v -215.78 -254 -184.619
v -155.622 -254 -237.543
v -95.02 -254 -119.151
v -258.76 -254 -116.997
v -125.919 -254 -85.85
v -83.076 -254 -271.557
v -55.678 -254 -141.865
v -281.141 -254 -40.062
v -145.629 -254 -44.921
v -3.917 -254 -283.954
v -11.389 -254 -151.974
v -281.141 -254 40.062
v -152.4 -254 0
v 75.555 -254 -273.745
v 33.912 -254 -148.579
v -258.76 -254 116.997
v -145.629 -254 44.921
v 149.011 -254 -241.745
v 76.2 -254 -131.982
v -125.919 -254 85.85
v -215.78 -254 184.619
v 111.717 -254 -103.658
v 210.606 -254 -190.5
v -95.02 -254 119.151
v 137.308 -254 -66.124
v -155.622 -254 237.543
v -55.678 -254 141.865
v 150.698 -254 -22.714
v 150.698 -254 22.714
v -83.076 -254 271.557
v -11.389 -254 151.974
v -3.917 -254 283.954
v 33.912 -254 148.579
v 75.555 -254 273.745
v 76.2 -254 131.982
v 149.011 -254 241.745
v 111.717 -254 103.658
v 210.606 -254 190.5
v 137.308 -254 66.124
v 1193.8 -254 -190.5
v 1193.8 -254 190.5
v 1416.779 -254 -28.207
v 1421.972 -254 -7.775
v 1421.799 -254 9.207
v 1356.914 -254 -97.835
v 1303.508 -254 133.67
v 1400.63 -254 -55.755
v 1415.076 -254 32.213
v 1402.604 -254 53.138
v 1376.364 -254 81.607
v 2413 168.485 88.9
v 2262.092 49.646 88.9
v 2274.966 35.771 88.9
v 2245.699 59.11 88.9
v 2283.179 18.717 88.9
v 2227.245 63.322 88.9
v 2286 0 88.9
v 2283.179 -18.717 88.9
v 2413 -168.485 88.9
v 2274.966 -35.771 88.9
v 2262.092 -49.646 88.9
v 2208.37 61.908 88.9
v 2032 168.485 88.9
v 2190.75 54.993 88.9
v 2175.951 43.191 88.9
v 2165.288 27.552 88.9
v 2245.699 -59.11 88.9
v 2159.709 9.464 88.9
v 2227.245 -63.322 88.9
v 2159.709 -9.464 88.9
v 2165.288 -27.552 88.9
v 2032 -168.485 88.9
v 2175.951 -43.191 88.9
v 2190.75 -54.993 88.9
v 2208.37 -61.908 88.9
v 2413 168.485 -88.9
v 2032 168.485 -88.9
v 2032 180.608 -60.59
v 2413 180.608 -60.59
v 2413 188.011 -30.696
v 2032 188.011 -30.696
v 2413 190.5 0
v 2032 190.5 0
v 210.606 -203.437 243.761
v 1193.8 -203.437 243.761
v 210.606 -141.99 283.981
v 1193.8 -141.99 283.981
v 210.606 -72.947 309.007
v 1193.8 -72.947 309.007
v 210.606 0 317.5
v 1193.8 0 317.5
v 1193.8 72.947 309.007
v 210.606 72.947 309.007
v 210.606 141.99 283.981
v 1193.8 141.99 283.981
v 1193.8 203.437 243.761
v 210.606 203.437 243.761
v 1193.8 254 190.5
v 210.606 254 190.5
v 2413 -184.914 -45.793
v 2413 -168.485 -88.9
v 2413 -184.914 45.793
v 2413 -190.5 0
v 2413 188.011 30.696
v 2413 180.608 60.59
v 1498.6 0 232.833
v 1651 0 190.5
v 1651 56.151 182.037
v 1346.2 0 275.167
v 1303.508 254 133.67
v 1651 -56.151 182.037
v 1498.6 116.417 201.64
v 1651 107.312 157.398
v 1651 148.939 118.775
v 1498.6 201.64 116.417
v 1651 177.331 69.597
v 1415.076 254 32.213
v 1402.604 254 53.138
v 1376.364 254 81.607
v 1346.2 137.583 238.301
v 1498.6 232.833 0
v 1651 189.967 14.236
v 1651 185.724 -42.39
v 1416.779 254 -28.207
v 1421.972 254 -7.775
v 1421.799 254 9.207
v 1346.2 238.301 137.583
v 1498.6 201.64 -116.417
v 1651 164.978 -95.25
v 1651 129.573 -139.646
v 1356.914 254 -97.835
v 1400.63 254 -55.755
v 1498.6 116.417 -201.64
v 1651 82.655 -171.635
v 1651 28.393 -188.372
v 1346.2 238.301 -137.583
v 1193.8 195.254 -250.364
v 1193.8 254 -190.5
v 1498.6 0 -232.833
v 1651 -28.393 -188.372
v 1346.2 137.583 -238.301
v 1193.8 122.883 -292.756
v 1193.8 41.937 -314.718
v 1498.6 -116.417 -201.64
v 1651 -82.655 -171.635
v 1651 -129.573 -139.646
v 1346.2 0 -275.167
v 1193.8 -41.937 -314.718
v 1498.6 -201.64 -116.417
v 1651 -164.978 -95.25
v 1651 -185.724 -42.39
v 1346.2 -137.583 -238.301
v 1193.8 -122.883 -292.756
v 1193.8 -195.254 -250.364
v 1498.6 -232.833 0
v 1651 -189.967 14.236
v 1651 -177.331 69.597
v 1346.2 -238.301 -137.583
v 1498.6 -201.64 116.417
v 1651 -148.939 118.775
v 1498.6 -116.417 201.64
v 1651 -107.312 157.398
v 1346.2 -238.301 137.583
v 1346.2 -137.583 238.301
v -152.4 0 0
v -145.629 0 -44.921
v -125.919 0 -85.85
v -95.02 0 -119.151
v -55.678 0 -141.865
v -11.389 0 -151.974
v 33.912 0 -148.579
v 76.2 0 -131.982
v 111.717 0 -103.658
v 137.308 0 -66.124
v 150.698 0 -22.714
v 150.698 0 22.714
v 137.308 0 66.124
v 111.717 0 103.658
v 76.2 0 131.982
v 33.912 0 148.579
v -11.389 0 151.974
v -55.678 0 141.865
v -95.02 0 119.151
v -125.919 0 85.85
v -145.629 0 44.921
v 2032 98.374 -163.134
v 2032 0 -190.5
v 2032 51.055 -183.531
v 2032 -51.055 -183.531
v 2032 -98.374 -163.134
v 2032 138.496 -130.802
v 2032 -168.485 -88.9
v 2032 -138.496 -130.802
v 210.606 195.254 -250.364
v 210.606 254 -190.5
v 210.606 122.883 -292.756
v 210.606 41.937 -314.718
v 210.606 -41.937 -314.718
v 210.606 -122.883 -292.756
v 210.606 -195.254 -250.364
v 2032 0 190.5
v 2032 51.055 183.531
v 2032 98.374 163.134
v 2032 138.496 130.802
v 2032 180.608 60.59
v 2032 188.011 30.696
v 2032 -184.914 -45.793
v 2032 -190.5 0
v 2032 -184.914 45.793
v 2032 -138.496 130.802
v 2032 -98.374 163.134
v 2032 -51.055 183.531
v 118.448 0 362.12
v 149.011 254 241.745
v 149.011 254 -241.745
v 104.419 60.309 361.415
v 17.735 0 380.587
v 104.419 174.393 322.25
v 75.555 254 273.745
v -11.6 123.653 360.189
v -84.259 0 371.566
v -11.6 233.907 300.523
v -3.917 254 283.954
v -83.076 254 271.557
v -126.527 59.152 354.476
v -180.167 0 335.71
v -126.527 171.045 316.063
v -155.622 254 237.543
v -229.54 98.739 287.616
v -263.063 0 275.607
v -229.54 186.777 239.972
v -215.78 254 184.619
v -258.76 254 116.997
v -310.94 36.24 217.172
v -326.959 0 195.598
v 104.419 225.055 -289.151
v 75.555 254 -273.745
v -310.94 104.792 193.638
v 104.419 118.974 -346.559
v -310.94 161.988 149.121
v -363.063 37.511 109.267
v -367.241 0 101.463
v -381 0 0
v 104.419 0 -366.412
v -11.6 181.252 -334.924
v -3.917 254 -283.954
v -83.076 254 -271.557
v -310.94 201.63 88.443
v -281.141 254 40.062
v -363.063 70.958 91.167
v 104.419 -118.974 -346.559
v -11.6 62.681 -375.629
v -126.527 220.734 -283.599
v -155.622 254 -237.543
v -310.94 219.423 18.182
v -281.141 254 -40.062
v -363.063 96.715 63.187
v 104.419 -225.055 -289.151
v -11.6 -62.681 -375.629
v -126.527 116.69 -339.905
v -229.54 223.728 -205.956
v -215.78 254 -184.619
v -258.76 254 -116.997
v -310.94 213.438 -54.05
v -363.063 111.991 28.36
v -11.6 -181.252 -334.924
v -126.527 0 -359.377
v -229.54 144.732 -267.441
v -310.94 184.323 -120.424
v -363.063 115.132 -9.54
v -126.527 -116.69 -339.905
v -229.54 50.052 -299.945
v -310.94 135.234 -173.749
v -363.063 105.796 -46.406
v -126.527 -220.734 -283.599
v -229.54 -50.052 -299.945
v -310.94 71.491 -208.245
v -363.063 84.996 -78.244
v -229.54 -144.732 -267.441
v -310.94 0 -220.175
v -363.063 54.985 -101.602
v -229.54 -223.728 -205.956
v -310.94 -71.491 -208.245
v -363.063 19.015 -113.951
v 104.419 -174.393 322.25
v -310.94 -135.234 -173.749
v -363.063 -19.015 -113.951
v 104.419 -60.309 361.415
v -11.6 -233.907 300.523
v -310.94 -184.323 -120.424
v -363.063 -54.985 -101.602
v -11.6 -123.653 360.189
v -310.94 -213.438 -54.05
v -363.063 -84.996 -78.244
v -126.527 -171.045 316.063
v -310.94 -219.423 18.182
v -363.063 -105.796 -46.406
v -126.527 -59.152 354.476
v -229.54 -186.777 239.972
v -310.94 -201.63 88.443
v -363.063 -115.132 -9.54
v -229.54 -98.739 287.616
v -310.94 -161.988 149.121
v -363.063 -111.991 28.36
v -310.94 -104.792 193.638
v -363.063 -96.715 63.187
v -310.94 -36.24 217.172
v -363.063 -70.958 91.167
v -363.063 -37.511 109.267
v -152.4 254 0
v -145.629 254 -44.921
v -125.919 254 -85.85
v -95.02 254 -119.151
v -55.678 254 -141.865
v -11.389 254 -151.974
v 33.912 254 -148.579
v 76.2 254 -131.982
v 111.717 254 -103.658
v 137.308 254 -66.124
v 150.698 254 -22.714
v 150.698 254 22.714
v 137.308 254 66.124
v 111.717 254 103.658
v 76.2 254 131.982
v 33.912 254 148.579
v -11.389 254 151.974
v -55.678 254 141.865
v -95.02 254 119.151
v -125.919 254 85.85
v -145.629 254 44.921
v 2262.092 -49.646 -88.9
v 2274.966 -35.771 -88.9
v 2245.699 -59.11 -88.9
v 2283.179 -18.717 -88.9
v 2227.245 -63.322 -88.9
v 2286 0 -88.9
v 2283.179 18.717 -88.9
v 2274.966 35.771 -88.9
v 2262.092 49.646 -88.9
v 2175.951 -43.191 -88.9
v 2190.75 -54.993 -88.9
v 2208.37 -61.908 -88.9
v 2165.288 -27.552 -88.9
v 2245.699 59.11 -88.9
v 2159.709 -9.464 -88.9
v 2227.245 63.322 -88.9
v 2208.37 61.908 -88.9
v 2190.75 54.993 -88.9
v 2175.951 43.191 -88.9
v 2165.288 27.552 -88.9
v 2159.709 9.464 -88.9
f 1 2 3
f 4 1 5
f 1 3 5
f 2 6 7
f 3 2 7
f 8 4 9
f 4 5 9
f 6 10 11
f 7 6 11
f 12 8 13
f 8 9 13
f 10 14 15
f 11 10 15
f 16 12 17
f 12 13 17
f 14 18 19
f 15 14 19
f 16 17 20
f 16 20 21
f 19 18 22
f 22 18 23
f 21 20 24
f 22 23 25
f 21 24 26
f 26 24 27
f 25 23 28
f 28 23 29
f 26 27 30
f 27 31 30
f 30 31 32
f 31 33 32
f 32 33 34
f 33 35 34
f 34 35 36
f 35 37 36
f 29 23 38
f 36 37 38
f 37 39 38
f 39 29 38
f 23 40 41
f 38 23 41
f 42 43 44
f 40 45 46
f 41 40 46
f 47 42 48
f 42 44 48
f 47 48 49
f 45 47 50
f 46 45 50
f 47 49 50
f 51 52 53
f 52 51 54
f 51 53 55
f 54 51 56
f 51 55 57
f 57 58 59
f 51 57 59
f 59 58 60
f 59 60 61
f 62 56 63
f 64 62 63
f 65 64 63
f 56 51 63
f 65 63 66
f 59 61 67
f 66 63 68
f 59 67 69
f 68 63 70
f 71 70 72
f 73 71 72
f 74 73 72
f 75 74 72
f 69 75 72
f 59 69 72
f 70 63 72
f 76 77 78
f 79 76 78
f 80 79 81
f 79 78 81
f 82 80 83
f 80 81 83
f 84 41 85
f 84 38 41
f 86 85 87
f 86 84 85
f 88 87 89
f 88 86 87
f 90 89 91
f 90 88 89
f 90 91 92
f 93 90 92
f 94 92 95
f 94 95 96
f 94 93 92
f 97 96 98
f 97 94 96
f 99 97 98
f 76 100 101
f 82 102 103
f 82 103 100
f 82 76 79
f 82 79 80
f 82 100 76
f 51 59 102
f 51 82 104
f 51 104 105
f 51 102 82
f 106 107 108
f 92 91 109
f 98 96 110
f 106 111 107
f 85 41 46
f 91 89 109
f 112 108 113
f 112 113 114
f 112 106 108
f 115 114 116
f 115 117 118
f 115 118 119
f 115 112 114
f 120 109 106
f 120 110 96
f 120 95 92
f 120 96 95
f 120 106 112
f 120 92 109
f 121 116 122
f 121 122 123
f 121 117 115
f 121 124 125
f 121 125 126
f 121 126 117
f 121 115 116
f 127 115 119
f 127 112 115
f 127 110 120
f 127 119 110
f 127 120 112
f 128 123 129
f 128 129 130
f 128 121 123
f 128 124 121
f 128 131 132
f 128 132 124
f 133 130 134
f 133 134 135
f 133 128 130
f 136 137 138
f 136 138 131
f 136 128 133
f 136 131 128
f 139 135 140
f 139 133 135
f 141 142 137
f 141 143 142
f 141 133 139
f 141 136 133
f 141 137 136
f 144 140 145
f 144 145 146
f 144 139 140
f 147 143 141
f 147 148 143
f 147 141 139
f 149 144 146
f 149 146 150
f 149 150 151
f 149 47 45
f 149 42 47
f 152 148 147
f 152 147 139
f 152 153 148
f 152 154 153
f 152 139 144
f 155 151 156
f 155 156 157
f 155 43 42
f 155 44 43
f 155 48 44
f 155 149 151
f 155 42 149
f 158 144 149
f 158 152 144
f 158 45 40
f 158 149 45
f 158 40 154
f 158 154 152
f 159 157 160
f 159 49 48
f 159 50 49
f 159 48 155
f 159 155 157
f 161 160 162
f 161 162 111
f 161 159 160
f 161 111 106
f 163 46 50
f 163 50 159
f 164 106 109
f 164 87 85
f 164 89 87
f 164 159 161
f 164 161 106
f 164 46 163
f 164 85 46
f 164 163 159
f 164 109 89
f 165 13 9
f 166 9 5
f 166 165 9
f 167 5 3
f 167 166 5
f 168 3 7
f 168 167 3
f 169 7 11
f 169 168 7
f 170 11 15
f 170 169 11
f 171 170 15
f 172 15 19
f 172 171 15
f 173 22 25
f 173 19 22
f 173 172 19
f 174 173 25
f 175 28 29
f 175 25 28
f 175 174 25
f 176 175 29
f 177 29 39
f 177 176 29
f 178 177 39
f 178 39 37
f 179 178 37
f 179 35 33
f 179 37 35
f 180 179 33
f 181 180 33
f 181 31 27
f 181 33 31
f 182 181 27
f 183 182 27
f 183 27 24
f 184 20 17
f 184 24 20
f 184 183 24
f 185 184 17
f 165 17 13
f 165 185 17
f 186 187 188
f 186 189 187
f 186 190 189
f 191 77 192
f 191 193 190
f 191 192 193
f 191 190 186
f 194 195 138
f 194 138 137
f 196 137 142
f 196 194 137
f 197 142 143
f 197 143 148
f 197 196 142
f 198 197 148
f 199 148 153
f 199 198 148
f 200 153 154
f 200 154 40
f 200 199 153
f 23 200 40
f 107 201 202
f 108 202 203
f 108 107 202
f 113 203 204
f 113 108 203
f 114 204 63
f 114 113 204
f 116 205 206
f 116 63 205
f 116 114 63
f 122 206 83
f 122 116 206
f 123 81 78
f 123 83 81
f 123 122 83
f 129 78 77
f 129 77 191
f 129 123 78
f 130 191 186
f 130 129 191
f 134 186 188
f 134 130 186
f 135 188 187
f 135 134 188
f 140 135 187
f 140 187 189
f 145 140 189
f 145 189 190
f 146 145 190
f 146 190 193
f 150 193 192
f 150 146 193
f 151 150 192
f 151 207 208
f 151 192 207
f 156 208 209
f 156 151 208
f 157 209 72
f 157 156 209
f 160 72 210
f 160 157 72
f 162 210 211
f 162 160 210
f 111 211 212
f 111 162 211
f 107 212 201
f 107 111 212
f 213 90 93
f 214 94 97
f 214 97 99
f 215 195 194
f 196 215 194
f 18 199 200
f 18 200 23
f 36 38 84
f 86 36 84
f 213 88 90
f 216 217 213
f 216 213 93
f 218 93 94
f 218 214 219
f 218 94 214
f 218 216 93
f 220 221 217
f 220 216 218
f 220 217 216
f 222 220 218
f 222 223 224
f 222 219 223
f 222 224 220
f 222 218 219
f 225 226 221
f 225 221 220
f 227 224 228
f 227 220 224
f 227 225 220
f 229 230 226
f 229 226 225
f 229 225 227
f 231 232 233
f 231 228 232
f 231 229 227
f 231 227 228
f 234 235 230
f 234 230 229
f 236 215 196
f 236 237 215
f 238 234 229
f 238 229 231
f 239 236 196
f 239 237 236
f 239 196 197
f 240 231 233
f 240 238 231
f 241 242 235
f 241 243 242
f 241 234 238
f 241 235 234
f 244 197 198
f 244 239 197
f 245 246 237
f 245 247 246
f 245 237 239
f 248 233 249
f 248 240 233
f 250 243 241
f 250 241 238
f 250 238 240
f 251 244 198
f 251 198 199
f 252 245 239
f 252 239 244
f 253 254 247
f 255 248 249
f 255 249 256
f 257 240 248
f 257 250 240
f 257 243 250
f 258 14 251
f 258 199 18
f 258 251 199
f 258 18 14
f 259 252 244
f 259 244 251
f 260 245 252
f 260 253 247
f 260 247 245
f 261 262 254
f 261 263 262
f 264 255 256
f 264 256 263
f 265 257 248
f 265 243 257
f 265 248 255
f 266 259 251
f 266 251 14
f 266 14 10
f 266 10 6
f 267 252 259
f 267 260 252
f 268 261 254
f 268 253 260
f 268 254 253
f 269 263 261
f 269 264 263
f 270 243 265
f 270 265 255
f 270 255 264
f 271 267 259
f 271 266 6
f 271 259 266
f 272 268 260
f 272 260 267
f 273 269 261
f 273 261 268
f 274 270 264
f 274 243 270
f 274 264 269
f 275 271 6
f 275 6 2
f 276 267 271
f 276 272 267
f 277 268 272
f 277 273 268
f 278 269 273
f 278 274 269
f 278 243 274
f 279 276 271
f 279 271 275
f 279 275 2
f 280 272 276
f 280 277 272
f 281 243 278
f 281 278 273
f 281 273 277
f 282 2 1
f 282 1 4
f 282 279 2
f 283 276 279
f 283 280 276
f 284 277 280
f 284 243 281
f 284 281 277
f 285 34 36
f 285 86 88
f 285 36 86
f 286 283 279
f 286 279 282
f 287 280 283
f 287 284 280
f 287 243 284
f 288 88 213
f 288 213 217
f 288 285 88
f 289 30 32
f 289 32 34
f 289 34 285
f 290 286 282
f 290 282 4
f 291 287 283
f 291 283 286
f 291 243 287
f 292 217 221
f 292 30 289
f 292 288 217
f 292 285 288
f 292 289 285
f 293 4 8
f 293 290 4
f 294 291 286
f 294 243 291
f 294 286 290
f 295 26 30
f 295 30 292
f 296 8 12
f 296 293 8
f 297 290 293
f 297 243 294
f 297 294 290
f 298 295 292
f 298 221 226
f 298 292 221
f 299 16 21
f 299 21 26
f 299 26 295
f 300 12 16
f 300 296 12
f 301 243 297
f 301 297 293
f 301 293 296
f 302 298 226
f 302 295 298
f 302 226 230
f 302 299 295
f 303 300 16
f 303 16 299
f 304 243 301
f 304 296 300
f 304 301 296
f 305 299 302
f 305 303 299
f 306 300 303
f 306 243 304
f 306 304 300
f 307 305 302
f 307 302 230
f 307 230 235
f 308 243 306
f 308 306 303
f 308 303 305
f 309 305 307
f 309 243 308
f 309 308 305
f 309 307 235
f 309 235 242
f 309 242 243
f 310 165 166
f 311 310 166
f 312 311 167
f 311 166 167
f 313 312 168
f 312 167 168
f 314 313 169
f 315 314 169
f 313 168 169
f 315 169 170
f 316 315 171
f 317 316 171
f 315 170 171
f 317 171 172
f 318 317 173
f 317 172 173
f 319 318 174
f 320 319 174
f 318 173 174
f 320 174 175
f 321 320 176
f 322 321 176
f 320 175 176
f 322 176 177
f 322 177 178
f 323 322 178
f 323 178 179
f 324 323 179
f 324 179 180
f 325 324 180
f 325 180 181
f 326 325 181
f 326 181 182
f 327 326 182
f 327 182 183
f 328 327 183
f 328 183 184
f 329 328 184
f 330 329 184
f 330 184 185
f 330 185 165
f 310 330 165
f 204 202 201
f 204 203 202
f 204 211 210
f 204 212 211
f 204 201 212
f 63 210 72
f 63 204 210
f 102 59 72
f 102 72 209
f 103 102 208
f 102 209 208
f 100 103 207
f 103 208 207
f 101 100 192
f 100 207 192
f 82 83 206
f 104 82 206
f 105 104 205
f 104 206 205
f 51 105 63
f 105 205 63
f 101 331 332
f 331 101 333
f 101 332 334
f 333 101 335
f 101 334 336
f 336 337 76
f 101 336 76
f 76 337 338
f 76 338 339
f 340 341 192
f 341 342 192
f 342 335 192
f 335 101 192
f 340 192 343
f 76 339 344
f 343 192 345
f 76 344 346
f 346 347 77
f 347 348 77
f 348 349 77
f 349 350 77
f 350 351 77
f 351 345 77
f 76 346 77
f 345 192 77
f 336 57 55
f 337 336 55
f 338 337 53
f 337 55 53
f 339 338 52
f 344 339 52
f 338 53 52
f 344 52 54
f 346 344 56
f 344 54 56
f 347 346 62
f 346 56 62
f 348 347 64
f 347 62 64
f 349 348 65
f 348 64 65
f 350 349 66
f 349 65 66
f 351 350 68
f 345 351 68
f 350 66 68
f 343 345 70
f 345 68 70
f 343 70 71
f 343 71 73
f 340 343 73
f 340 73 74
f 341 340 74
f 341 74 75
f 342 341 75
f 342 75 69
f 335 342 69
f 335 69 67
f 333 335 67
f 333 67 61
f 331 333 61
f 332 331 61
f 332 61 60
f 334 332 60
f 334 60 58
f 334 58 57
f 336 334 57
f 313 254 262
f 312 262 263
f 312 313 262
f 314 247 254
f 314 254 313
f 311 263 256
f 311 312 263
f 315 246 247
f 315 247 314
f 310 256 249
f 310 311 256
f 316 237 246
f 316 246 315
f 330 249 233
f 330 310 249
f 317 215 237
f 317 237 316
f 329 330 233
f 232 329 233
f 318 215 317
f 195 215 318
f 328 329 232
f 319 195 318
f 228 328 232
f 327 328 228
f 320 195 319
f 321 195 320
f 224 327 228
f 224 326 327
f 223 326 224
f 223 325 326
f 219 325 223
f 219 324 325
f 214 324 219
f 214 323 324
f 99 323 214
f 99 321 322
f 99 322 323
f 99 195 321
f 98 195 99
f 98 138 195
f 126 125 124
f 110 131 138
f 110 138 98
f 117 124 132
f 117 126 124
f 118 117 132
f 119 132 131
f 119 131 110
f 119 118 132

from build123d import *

# Parameters (mm, degrees)
F3_DEPTH      = 381
F4_R          = 63.5
F5_DEPTH      = 469.901
F6_W          = 139.7
F6_H          = 871.2193071842
F7_DEPTH      = 2794.001
F8_DEPTH      = 254.001
F8_DEPTH_BACK = 254.001


# Not quite as in the source:
# - a feature names something its author has since deleted; it is built from what else it names


with BuildPart() as f1:
    # F0 (on Front) → F1 (revolve)
    with BuildSketch(Plane.XZ):
        with BuildLine():
            ThreePointArc((-152.4, 0), (0, 152.4), (152.4, 0))
            Line((152.4, 0), (2032, 0))
            Line((2032, 0), (2032, 190.5))
            Line((2032, 190.5), (1651, 190.5))
            Line((1651, 190.5), (1193.8, 317.5))
            Line((1193.8, 317.5), (210.6056741876, 317.5))
            ThreePointArc((210.6056741876, 317.5), (-180.1669200138, 335.7095186806), (-381, 0))
            Line((-381, 0), (-152.4, 0))
        make_face()
    revolve(axis=Axis((-190.5, 0, 0), (-1, 0, 0)))

    # F2 (on face) → F3 (join)
    with BuildSketch(Plane.YZ.offset(2032)):
        with BuildLine():
            Line((168.4845393501, 88.9), (-168.4845393501, 88.9))
            ThreePointArc((-168.4845393501, 88.9), (-190.5, 0), (-168.4845393501, -88.9))
            Line((-168.4845393501, -88.9), (168.4845393501, -88.9))
            ThreePointArc((168.4845393501, -88.9), (184.9142432943, -45.792713688), (190.5, 0))
            ThreePointArc((190.5, 0), (184.9142432943, 45.792713688), (168.4845393501, 88.9))
        make_face()
    extrude(amount=F3_DEPTH)

    # F4 (on face) → F5 (cut, through all)
    with BuildSketch(Plane.XY.offset(88.9)):
        with Locations((2222.5, 0)):
            Circle(F4_R)
    extrude(amount=-F5_DEPTH, mode=Mode.SUBTRACT)

    # F6 (on face) → F7 (cut, through all)
    with BuildSketch(Plane.YZ.offset(2413)):
        with Locations((323.85, 2.3357123137)):
            Rectangle(F6_W, F6_H)
        Polygon((-254, -433.2739412785), (-254, 0), (-254, 437.9453659058), (-393.7, 437.9453659058), (-393.7, -433.2739412785), align=None)
    extrude(amount=-F7_DEPTH, mode=Mode.SUBTRACT)

    # F0 (on Front) → F8 (cut, two sides)
    with BuildSketch(Plane.XZ) as f8_sk:
        with BuildLine():
            Line((-152.4, 0), (0, 0))
            Line((0, 0), (152.4, 0))
            ThreePointArc((152.4, 0), (0, 152.4), (-152.4, 0))
        make_face()
        with BuildLine():
            Line((152.4, 0), (0, 0))
            Line((0, 0), (-152.4, 0))
            ThreePointArc((-152.4, 0), (0, -152.4), (152.4, 0))
        make_face()
    extrude(amount=F8_DEPTH, mode=Mode.SUBTRACT)
    extrude(f8_sk.sketch, amount=-F8_DEPTH_BACK, mode=Mode.SUBTRACT)


solid = f1.part
